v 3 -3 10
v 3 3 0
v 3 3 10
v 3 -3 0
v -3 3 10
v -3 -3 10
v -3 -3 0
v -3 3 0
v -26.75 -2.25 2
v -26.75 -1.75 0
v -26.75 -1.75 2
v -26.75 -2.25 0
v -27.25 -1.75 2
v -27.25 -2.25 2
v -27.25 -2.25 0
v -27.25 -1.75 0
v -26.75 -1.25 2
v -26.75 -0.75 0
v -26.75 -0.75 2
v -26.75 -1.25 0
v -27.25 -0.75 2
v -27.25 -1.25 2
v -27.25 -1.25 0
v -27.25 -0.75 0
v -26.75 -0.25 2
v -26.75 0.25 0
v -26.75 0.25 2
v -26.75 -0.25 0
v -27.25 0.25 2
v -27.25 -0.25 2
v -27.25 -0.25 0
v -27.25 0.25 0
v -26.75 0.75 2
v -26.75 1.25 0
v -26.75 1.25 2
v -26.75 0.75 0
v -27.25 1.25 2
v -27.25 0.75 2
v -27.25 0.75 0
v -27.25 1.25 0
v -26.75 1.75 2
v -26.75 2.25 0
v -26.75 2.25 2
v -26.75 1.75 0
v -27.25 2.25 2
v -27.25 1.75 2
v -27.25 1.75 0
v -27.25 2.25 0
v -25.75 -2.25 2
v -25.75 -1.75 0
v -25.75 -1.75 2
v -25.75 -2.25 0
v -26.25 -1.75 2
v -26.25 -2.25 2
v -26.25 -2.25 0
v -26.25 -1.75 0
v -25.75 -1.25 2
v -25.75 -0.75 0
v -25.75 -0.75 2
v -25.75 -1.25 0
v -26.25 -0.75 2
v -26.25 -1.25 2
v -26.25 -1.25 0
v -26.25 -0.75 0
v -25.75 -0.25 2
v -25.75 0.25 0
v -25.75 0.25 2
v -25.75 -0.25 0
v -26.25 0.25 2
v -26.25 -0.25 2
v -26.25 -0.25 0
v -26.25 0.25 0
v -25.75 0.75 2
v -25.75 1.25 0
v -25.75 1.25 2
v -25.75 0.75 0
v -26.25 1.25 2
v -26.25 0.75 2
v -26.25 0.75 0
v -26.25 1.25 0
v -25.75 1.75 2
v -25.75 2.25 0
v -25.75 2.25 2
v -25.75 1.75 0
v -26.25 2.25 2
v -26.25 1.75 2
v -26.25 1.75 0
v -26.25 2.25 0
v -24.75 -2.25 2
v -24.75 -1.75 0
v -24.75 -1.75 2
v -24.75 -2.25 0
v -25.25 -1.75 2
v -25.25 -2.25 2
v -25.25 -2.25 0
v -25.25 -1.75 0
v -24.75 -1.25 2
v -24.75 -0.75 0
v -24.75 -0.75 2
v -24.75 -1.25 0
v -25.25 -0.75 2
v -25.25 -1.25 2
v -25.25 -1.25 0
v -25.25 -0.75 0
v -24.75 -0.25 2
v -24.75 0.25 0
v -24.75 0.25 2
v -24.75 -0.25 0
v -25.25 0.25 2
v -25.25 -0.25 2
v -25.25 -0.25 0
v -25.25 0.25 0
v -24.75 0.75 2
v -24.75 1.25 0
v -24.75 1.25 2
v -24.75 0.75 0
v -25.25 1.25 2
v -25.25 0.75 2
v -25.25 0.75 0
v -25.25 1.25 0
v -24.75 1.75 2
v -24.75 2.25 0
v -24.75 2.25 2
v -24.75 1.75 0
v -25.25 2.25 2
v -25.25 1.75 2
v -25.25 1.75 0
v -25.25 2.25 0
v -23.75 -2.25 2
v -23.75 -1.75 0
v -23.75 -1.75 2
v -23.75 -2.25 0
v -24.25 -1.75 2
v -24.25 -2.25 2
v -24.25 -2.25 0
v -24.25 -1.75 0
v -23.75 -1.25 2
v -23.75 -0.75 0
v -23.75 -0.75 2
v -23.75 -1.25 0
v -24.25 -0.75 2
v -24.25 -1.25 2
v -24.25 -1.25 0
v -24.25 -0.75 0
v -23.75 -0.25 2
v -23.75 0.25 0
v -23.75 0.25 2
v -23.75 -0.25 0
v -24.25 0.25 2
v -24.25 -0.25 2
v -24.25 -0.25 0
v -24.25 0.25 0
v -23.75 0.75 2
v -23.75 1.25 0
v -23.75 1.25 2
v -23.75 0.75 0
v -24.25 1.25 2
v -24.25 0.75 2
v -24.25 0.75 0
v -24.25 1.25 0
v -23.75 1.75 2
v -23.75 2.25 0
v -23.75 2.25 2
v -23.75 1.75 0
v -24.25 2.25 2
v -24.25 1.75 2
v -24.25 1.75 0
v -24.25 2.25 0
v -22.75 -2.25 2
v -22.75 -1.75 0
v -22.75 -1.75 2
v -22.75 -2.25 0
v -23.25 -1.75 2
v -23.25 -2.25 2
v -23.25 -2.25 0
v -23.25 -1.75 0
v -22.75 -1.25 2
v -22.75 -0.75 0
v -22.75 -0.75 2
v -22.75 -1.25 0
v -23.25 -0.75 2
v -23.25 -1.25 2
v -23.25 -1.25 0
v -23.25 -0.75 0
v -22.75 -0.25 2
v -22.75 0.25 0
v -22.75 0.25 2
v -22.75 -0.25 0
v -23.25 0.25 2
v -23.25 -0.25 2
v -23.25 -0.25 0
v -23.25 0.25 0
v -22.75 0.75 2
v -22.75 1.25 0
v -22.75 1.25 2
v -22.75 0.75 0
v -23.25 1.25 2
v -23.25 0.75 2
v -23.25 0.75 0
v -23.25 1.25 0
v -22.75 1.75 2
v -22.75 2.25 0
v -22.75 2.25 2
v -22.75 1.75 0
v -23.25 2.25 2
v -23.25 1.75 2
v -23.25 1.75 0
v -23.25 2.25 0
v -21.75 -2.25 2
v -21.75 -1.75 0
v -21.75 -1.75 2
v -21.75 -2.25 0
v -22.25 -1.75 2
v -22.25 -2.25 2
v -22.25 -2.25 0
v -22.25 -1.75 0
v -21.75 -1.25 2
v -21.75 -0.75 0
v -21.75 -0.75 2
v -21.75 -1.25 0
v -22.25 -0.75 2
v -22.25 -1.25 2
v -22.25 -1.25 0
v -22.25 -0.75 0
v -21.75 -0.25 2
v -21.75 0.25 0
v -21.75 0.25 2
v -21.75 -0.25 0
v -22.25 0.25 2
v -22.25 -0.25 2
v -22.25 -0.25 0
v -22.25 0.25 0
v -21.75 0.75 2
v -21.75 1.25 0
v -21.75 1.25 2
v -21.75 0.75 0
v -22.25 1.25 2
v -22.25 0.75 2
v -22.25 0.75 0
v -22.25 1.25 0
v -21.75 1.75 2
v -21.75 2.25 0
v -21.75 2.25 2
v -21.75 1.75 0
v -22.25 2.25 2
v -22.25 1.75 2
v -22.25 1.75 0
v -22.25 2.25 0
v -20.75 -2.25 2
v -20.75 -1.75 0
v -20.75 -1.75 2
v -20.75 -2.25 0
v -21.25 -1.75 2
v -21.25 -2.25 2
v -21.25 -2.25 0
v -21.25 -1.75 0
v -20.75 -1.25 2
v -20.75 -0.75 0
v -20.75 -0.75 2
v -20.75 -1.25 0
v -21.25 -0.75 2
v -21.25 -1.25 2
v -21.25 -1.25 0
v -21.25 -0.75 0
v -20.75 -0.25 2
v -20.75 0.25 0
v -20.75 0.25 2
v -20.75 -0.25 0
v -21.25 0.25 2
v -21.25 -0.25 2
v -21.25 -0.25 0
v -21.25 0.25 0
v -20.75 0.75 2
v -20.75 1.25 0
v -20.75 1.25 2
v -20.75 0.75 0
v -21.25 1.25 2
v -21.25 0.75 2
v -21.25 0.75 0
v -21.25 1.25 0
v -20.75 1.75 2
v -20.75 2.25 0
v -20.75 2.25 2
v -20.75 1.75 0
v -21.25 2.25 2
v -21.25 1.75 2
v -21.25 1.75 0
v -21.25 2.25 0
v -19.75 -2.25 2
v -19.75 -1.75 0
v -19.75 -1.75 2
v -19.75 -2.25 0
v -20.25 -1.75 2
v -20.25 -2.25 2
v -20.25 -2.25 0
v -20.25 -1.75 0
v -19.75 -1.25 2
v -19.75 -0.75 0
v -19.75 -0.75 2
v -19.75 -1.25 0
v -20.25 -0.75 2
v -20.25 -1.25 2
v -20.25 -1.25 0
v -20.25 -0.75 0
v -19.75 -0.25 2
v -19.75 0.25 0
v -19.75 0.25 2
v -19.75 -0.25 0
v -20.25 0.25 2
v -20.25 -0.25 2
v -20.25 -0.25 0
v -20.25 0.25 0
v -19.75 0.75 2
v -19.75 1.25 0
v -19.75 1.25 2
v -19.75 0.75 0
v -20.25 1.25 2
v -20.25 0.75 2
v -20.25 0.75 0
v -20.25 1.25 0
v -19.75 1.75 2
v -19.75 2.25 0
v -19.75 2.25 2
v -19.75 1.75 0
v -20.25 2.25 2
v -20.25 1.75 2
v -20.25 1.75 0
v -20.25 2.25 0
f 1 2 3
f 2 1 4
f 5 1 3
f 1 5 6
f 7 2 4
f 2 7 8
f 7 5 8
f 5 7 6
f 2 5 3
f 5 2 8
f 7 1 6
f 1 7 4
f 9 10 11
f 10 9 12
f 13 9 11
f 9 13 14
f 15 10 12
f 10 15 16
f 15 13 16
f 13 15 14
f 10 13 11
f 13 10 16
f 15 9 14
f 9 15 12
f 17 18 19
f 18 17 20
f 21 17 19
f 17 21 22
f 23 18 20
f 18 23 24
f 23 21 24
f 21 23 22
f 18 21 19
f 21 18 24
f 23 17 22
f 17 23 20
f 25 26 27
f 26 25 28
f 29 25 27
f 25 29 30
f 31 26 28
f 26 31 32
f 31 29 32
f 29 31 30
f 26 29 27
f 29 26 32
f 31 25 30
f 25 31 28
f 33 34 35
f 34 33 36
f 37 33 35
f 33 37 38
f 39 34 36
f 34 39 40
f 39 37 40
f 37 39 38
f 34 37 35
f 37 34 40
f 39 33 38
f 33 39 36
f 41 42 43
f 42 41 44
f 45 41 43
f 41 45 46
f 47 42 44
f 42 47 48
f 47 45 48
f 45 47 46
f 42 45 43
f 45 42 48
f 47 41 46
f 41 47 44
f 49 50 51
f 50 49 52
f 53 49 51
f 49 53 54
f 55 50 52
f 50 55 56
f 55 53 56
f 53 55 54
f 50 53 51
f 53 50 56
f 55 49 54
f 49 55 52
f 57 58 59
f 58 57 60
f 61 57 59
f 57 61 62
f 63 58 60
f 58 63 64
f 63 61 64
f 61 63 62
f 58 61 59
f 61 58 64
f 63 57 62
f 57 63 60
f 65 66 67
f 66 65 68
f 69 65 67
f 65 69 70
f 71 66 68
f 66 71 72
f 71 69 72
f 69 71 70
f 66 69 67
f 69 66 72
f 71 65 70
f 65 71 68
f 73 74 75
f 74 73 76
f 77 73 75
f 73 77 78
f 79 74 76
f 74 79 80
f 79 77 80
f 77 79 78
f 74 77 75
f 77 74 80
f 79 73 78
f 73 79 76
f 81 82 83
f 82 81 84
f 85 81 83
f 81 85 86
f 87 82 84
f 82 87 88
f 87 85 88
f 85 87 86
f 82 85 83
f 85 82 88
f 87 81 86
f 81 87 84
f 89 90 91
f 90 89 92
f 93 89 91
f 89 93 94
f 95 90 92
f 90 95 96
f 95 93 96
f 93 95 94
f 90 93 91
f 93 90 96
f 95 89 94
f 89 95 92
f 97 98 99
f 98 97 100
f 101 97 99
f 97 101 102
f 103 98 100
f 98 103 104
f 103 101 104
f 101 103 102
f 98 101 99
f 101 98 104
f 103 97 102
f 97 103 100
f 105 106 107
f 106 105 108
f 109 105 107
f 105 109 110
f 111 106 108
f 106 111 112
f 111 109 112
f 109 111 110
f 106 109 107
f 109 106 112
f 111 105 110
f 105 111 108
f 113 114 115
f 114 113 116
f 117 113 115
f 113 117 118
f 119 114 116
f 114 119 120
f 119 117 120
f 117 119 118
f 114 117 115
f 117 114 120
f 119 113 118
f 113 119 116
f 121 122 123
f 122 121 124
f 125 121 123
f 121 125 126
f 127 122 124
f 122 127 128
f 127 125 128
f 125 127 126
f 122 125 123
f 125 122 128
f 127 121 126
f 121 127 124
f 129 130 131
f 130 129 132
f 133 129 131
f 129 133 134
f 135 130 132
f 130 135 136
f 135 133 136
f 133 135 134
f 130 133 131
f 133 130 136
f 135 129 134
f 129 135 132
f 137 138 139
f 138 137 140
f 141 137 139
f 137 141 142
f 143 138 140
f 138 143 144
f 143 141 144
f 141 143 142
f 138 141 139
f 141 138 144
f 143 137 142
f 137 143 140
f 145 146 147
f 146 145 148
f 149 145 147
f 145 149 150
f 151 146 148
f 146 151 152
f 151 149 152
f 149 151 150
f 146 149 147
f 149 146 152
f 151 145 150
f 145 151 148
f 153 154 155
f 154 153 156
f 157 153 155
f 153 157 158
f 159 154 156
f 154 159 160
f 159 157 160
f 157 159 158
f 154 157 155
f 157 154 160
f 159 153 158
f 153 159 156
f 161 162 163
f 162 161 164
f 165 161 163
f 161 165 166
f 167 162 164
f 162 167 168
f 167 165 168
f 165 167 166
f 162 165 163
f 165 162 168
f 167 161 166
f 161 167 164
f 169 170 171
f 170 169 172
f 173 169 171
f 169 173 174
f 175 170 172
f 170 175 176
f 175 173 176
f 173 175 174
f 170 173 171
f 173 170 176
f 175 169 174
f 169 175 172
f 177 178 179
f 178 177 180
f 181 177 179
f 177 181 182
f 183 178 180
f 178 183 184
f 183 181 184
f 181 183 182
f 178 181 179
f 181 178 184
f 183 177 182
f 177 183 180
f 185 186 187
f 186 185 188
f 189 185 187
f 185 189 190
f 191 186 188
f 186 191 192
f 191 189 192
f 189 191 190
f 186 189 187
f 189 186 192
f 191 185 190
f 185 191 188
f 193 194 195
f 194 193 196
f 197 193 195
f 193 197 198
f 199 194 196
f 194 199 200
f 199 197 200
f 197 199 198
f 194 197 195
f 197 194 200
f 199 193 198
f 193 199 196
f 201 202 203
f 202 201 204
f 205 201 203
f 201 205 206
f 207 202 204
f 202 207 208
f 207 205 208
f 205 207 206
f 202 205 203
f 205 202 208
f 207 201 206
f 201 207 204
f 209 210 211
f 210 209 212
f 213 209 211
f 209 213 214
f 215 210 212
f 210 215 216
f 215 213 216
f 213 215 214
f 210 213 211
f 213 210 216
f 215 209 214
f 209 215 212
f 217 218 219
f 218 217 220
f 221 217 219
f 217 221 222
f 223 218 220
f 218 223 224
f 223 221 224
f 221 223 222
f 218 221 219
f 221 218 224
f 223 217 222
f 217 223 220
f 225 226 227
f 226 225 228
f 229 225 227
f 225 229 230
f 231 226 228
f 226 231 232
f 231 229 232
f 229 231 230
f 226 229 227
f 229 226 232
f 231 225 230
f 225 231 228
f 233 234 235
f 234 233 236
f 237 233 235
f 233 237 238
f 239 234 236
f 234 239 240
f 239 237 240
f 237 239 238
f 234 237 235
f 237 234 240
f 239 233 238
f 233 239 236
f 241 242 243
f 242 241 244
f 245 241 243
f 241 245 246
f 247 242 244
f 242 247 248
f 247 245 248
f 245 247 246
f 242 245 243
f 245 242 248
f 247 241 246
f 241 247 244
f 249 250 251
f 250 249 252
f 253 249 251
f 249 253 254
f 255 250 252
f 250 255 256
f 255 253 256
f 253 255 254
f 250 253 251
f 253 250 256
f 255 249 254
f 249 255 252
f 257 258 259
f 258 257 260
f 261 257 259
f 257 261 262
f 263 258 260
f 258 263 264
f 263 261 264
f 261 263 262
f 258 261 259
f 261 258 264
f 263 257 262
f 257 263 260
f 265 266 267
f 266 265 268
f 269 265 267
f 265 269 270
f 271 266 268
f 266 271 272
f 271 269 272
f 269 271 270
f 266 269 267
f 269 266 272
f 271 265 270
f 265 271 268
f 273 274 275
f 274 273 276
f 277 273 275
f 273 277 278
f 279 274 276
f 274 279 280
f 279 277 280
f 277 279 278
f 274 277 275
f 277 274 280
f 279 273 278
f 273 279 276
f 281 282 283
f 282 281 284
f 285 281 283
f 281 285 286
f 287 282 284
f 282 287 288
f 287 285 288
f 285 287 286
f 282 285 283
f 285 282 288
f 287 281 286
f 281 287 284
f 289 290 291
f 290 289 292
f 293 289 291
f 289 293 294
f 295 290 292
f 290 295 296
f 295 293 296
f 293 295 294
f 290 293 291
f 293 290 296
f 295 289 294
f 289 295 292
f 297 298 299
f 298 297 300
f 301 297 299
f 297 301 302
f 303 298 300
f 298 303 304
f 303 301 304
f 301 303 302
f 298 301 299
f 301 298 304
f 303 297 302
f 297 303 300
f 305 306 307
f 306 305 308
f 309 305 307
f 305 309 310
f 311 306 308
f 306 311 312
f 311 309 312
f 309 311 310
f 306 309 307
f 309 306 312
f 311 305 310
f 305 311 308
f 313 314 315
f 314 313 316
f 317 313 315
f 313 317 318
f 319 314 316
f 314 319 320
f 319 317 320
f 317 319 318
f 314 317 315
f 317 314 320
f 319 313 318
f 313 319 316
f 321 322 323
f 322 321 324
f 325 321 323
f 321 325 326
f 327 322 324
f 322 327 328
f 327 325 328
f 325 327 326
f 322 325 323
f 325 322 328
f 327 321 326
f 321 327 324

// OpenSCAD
translate([0, 0, 5]) color([0,1,0,0.9]) cube([6, 6, 10], center=true);
translate([-27.0, -2.0, 1]) color([1,0,0]) cube([0.5, 0.5, 2], center=true);
translate([-27.0, -1.0, 1]) color([1,0,0]) cube([0.5, 0.5, 2], center=true);
translate([-27.0, 0.0, 1]) color([1,0,0]) cube([0.5, 0.5, 2], center=true);
translate([-27.0, 1.0, 1]) color([1,0,0]) cube([0.5, 0.5, 2], center=true);
translate([-27.0, 2.0, 1]) color([1,0,0]) cube([0.5, 0.5, 2], center=true);
translate([-26.0, -2.0, 1]) color([1,0,0]) cube([0.5, 0.5, 2], center=true);
translate([-26.0, -1.0, 1]) color([1,0,0]) cube([0.5, 0.5, 2], center=true);
translate([-26.0, 0.0, 1]) color([1,0,0]) cube([0.5, 0.5, 2], center=true);
translate([-26.0, 1.0, 1]) color([1,0,0]) cube([0.5, 0.5, 2], center=true);
translate([-26.0, 2.0, 1]) color([1,0,0]) cube([0.5, 0.5, 2], center=true);
translate([-25.0, -2.0, 1]) color([1,0,0]) cube([0.5, 0.5, 2], center=true);
translate([-25.0, -1.0, 1]) color([1,0,0]) cube([0.5, 0.5, 2], center=true);
translate([-25.0, 0.0, 1]) color([1,0,0]) cube([0.5, 0.5, 2], center=true);
translate([-25.0, 1.0, 1]) color([1,0,0]) cube([0.5, 0.5, 2], center=true);
translate([-25.0, 2.0, 1]) color([1,0,0]) cube([0.5, 0.5, 2], center=true);
translate([-24.0, -2.0, 1]) color([1,0,0]) cube([0.5, 0.5, 2], center=true);
translate([-24.0, -1.0, 1]) color([1,0,0]) cube([0.5, 0.5, 2], center=true);
translate([-24.0, 0.0, 1]) color([1,0,0]) cube([0.5, 0.5, 2], center=true);
translate([-24.0, 1.0, 1]) color([1,0,0]) cube([0.5, 0.5, 2], center=true);
translate([-24.0, 2.0, 1]) color([1,0,0]) cube([0.5, 0.5, 2], center=true);
translate([-23.0, -2.0, 1]) color([1,0,0]) cube([0.5, 0.5, 2], center=true);
translate([-23.0, -1.0, 1]) color([1,0,0]) cube([0.5, 0.5, 2], center=true);
translate([-23.0, 0.0, 1]) color([1,0,0]) cube([0.5, 0.5, 2], center=true);
translate([-23.0, 1.0, 1]) color([1,0,0]) cube([0.5, 0.5, 2], center=true);
translate([-23.0, 2.0, 1]) color([1,0,0]) cube([0.5, 0.5, 2], center=true);
translate([-22.0, -2.0, 1]) color([1,0,0]) cube([0.5, 0.5, 2], center=true);
translate([-22.0, -1.0, 1]) color([1,0,0]) cube([0.5, 0.5, 2], center=true);
translate([-22.0, 0.0, 1]) color([1,0,0]) cube([0.5, 0.5, 2], center=true);
translate([-22.0, 1.0, 1]) color([1,0,0]) cube([0.5, 0.5, 2], center=true);
translate([-22.0, 2.0, 1]) color([1,0,0]) cube([0.5, 0.5, 2], center=true);
translate([-21.0, -2.0, 1]) color([1,0,0]) cube([0.5, 0.5, 2], center=true);
translate([-21.0, -1.0, 1]) color([1,0,0]) cube([0.5, 0.5, 2], center=true);
translate([-21.0, 0.0, 1]) color([1,0,0]) cube([0.5, 0.5, 2], center=true);
translate([-21.0, 1.0, 1]) color([1,0,0]) cube([0.5, 0.5, 2], center=true);
translate([-21.0, 2.0, 1]) color([1,0,0]) cube([0.5, 0.5, 2], center=true);
translate([-20.0, -2.0, 1]) color([1,0,0]) cube([0.5, 0.5, 2], center=true);
translate([-20.0, -1.0, 1]) color([1,0,0]) cube([0.5, 0.5, 2], center=true);
translate([-20.0, 0.0, 1]) color([1,0,0]) cube([0.5, 0.5, 2], center=true);
translate([-20.0, 1.0, 1]) color([1,0,0]) cube([0.5, 0.5, 2], center=true);
translate([-20.0, 2.0, 1]) color([1,0,0]) cube([0.5, 0.5, 2], center=true);
